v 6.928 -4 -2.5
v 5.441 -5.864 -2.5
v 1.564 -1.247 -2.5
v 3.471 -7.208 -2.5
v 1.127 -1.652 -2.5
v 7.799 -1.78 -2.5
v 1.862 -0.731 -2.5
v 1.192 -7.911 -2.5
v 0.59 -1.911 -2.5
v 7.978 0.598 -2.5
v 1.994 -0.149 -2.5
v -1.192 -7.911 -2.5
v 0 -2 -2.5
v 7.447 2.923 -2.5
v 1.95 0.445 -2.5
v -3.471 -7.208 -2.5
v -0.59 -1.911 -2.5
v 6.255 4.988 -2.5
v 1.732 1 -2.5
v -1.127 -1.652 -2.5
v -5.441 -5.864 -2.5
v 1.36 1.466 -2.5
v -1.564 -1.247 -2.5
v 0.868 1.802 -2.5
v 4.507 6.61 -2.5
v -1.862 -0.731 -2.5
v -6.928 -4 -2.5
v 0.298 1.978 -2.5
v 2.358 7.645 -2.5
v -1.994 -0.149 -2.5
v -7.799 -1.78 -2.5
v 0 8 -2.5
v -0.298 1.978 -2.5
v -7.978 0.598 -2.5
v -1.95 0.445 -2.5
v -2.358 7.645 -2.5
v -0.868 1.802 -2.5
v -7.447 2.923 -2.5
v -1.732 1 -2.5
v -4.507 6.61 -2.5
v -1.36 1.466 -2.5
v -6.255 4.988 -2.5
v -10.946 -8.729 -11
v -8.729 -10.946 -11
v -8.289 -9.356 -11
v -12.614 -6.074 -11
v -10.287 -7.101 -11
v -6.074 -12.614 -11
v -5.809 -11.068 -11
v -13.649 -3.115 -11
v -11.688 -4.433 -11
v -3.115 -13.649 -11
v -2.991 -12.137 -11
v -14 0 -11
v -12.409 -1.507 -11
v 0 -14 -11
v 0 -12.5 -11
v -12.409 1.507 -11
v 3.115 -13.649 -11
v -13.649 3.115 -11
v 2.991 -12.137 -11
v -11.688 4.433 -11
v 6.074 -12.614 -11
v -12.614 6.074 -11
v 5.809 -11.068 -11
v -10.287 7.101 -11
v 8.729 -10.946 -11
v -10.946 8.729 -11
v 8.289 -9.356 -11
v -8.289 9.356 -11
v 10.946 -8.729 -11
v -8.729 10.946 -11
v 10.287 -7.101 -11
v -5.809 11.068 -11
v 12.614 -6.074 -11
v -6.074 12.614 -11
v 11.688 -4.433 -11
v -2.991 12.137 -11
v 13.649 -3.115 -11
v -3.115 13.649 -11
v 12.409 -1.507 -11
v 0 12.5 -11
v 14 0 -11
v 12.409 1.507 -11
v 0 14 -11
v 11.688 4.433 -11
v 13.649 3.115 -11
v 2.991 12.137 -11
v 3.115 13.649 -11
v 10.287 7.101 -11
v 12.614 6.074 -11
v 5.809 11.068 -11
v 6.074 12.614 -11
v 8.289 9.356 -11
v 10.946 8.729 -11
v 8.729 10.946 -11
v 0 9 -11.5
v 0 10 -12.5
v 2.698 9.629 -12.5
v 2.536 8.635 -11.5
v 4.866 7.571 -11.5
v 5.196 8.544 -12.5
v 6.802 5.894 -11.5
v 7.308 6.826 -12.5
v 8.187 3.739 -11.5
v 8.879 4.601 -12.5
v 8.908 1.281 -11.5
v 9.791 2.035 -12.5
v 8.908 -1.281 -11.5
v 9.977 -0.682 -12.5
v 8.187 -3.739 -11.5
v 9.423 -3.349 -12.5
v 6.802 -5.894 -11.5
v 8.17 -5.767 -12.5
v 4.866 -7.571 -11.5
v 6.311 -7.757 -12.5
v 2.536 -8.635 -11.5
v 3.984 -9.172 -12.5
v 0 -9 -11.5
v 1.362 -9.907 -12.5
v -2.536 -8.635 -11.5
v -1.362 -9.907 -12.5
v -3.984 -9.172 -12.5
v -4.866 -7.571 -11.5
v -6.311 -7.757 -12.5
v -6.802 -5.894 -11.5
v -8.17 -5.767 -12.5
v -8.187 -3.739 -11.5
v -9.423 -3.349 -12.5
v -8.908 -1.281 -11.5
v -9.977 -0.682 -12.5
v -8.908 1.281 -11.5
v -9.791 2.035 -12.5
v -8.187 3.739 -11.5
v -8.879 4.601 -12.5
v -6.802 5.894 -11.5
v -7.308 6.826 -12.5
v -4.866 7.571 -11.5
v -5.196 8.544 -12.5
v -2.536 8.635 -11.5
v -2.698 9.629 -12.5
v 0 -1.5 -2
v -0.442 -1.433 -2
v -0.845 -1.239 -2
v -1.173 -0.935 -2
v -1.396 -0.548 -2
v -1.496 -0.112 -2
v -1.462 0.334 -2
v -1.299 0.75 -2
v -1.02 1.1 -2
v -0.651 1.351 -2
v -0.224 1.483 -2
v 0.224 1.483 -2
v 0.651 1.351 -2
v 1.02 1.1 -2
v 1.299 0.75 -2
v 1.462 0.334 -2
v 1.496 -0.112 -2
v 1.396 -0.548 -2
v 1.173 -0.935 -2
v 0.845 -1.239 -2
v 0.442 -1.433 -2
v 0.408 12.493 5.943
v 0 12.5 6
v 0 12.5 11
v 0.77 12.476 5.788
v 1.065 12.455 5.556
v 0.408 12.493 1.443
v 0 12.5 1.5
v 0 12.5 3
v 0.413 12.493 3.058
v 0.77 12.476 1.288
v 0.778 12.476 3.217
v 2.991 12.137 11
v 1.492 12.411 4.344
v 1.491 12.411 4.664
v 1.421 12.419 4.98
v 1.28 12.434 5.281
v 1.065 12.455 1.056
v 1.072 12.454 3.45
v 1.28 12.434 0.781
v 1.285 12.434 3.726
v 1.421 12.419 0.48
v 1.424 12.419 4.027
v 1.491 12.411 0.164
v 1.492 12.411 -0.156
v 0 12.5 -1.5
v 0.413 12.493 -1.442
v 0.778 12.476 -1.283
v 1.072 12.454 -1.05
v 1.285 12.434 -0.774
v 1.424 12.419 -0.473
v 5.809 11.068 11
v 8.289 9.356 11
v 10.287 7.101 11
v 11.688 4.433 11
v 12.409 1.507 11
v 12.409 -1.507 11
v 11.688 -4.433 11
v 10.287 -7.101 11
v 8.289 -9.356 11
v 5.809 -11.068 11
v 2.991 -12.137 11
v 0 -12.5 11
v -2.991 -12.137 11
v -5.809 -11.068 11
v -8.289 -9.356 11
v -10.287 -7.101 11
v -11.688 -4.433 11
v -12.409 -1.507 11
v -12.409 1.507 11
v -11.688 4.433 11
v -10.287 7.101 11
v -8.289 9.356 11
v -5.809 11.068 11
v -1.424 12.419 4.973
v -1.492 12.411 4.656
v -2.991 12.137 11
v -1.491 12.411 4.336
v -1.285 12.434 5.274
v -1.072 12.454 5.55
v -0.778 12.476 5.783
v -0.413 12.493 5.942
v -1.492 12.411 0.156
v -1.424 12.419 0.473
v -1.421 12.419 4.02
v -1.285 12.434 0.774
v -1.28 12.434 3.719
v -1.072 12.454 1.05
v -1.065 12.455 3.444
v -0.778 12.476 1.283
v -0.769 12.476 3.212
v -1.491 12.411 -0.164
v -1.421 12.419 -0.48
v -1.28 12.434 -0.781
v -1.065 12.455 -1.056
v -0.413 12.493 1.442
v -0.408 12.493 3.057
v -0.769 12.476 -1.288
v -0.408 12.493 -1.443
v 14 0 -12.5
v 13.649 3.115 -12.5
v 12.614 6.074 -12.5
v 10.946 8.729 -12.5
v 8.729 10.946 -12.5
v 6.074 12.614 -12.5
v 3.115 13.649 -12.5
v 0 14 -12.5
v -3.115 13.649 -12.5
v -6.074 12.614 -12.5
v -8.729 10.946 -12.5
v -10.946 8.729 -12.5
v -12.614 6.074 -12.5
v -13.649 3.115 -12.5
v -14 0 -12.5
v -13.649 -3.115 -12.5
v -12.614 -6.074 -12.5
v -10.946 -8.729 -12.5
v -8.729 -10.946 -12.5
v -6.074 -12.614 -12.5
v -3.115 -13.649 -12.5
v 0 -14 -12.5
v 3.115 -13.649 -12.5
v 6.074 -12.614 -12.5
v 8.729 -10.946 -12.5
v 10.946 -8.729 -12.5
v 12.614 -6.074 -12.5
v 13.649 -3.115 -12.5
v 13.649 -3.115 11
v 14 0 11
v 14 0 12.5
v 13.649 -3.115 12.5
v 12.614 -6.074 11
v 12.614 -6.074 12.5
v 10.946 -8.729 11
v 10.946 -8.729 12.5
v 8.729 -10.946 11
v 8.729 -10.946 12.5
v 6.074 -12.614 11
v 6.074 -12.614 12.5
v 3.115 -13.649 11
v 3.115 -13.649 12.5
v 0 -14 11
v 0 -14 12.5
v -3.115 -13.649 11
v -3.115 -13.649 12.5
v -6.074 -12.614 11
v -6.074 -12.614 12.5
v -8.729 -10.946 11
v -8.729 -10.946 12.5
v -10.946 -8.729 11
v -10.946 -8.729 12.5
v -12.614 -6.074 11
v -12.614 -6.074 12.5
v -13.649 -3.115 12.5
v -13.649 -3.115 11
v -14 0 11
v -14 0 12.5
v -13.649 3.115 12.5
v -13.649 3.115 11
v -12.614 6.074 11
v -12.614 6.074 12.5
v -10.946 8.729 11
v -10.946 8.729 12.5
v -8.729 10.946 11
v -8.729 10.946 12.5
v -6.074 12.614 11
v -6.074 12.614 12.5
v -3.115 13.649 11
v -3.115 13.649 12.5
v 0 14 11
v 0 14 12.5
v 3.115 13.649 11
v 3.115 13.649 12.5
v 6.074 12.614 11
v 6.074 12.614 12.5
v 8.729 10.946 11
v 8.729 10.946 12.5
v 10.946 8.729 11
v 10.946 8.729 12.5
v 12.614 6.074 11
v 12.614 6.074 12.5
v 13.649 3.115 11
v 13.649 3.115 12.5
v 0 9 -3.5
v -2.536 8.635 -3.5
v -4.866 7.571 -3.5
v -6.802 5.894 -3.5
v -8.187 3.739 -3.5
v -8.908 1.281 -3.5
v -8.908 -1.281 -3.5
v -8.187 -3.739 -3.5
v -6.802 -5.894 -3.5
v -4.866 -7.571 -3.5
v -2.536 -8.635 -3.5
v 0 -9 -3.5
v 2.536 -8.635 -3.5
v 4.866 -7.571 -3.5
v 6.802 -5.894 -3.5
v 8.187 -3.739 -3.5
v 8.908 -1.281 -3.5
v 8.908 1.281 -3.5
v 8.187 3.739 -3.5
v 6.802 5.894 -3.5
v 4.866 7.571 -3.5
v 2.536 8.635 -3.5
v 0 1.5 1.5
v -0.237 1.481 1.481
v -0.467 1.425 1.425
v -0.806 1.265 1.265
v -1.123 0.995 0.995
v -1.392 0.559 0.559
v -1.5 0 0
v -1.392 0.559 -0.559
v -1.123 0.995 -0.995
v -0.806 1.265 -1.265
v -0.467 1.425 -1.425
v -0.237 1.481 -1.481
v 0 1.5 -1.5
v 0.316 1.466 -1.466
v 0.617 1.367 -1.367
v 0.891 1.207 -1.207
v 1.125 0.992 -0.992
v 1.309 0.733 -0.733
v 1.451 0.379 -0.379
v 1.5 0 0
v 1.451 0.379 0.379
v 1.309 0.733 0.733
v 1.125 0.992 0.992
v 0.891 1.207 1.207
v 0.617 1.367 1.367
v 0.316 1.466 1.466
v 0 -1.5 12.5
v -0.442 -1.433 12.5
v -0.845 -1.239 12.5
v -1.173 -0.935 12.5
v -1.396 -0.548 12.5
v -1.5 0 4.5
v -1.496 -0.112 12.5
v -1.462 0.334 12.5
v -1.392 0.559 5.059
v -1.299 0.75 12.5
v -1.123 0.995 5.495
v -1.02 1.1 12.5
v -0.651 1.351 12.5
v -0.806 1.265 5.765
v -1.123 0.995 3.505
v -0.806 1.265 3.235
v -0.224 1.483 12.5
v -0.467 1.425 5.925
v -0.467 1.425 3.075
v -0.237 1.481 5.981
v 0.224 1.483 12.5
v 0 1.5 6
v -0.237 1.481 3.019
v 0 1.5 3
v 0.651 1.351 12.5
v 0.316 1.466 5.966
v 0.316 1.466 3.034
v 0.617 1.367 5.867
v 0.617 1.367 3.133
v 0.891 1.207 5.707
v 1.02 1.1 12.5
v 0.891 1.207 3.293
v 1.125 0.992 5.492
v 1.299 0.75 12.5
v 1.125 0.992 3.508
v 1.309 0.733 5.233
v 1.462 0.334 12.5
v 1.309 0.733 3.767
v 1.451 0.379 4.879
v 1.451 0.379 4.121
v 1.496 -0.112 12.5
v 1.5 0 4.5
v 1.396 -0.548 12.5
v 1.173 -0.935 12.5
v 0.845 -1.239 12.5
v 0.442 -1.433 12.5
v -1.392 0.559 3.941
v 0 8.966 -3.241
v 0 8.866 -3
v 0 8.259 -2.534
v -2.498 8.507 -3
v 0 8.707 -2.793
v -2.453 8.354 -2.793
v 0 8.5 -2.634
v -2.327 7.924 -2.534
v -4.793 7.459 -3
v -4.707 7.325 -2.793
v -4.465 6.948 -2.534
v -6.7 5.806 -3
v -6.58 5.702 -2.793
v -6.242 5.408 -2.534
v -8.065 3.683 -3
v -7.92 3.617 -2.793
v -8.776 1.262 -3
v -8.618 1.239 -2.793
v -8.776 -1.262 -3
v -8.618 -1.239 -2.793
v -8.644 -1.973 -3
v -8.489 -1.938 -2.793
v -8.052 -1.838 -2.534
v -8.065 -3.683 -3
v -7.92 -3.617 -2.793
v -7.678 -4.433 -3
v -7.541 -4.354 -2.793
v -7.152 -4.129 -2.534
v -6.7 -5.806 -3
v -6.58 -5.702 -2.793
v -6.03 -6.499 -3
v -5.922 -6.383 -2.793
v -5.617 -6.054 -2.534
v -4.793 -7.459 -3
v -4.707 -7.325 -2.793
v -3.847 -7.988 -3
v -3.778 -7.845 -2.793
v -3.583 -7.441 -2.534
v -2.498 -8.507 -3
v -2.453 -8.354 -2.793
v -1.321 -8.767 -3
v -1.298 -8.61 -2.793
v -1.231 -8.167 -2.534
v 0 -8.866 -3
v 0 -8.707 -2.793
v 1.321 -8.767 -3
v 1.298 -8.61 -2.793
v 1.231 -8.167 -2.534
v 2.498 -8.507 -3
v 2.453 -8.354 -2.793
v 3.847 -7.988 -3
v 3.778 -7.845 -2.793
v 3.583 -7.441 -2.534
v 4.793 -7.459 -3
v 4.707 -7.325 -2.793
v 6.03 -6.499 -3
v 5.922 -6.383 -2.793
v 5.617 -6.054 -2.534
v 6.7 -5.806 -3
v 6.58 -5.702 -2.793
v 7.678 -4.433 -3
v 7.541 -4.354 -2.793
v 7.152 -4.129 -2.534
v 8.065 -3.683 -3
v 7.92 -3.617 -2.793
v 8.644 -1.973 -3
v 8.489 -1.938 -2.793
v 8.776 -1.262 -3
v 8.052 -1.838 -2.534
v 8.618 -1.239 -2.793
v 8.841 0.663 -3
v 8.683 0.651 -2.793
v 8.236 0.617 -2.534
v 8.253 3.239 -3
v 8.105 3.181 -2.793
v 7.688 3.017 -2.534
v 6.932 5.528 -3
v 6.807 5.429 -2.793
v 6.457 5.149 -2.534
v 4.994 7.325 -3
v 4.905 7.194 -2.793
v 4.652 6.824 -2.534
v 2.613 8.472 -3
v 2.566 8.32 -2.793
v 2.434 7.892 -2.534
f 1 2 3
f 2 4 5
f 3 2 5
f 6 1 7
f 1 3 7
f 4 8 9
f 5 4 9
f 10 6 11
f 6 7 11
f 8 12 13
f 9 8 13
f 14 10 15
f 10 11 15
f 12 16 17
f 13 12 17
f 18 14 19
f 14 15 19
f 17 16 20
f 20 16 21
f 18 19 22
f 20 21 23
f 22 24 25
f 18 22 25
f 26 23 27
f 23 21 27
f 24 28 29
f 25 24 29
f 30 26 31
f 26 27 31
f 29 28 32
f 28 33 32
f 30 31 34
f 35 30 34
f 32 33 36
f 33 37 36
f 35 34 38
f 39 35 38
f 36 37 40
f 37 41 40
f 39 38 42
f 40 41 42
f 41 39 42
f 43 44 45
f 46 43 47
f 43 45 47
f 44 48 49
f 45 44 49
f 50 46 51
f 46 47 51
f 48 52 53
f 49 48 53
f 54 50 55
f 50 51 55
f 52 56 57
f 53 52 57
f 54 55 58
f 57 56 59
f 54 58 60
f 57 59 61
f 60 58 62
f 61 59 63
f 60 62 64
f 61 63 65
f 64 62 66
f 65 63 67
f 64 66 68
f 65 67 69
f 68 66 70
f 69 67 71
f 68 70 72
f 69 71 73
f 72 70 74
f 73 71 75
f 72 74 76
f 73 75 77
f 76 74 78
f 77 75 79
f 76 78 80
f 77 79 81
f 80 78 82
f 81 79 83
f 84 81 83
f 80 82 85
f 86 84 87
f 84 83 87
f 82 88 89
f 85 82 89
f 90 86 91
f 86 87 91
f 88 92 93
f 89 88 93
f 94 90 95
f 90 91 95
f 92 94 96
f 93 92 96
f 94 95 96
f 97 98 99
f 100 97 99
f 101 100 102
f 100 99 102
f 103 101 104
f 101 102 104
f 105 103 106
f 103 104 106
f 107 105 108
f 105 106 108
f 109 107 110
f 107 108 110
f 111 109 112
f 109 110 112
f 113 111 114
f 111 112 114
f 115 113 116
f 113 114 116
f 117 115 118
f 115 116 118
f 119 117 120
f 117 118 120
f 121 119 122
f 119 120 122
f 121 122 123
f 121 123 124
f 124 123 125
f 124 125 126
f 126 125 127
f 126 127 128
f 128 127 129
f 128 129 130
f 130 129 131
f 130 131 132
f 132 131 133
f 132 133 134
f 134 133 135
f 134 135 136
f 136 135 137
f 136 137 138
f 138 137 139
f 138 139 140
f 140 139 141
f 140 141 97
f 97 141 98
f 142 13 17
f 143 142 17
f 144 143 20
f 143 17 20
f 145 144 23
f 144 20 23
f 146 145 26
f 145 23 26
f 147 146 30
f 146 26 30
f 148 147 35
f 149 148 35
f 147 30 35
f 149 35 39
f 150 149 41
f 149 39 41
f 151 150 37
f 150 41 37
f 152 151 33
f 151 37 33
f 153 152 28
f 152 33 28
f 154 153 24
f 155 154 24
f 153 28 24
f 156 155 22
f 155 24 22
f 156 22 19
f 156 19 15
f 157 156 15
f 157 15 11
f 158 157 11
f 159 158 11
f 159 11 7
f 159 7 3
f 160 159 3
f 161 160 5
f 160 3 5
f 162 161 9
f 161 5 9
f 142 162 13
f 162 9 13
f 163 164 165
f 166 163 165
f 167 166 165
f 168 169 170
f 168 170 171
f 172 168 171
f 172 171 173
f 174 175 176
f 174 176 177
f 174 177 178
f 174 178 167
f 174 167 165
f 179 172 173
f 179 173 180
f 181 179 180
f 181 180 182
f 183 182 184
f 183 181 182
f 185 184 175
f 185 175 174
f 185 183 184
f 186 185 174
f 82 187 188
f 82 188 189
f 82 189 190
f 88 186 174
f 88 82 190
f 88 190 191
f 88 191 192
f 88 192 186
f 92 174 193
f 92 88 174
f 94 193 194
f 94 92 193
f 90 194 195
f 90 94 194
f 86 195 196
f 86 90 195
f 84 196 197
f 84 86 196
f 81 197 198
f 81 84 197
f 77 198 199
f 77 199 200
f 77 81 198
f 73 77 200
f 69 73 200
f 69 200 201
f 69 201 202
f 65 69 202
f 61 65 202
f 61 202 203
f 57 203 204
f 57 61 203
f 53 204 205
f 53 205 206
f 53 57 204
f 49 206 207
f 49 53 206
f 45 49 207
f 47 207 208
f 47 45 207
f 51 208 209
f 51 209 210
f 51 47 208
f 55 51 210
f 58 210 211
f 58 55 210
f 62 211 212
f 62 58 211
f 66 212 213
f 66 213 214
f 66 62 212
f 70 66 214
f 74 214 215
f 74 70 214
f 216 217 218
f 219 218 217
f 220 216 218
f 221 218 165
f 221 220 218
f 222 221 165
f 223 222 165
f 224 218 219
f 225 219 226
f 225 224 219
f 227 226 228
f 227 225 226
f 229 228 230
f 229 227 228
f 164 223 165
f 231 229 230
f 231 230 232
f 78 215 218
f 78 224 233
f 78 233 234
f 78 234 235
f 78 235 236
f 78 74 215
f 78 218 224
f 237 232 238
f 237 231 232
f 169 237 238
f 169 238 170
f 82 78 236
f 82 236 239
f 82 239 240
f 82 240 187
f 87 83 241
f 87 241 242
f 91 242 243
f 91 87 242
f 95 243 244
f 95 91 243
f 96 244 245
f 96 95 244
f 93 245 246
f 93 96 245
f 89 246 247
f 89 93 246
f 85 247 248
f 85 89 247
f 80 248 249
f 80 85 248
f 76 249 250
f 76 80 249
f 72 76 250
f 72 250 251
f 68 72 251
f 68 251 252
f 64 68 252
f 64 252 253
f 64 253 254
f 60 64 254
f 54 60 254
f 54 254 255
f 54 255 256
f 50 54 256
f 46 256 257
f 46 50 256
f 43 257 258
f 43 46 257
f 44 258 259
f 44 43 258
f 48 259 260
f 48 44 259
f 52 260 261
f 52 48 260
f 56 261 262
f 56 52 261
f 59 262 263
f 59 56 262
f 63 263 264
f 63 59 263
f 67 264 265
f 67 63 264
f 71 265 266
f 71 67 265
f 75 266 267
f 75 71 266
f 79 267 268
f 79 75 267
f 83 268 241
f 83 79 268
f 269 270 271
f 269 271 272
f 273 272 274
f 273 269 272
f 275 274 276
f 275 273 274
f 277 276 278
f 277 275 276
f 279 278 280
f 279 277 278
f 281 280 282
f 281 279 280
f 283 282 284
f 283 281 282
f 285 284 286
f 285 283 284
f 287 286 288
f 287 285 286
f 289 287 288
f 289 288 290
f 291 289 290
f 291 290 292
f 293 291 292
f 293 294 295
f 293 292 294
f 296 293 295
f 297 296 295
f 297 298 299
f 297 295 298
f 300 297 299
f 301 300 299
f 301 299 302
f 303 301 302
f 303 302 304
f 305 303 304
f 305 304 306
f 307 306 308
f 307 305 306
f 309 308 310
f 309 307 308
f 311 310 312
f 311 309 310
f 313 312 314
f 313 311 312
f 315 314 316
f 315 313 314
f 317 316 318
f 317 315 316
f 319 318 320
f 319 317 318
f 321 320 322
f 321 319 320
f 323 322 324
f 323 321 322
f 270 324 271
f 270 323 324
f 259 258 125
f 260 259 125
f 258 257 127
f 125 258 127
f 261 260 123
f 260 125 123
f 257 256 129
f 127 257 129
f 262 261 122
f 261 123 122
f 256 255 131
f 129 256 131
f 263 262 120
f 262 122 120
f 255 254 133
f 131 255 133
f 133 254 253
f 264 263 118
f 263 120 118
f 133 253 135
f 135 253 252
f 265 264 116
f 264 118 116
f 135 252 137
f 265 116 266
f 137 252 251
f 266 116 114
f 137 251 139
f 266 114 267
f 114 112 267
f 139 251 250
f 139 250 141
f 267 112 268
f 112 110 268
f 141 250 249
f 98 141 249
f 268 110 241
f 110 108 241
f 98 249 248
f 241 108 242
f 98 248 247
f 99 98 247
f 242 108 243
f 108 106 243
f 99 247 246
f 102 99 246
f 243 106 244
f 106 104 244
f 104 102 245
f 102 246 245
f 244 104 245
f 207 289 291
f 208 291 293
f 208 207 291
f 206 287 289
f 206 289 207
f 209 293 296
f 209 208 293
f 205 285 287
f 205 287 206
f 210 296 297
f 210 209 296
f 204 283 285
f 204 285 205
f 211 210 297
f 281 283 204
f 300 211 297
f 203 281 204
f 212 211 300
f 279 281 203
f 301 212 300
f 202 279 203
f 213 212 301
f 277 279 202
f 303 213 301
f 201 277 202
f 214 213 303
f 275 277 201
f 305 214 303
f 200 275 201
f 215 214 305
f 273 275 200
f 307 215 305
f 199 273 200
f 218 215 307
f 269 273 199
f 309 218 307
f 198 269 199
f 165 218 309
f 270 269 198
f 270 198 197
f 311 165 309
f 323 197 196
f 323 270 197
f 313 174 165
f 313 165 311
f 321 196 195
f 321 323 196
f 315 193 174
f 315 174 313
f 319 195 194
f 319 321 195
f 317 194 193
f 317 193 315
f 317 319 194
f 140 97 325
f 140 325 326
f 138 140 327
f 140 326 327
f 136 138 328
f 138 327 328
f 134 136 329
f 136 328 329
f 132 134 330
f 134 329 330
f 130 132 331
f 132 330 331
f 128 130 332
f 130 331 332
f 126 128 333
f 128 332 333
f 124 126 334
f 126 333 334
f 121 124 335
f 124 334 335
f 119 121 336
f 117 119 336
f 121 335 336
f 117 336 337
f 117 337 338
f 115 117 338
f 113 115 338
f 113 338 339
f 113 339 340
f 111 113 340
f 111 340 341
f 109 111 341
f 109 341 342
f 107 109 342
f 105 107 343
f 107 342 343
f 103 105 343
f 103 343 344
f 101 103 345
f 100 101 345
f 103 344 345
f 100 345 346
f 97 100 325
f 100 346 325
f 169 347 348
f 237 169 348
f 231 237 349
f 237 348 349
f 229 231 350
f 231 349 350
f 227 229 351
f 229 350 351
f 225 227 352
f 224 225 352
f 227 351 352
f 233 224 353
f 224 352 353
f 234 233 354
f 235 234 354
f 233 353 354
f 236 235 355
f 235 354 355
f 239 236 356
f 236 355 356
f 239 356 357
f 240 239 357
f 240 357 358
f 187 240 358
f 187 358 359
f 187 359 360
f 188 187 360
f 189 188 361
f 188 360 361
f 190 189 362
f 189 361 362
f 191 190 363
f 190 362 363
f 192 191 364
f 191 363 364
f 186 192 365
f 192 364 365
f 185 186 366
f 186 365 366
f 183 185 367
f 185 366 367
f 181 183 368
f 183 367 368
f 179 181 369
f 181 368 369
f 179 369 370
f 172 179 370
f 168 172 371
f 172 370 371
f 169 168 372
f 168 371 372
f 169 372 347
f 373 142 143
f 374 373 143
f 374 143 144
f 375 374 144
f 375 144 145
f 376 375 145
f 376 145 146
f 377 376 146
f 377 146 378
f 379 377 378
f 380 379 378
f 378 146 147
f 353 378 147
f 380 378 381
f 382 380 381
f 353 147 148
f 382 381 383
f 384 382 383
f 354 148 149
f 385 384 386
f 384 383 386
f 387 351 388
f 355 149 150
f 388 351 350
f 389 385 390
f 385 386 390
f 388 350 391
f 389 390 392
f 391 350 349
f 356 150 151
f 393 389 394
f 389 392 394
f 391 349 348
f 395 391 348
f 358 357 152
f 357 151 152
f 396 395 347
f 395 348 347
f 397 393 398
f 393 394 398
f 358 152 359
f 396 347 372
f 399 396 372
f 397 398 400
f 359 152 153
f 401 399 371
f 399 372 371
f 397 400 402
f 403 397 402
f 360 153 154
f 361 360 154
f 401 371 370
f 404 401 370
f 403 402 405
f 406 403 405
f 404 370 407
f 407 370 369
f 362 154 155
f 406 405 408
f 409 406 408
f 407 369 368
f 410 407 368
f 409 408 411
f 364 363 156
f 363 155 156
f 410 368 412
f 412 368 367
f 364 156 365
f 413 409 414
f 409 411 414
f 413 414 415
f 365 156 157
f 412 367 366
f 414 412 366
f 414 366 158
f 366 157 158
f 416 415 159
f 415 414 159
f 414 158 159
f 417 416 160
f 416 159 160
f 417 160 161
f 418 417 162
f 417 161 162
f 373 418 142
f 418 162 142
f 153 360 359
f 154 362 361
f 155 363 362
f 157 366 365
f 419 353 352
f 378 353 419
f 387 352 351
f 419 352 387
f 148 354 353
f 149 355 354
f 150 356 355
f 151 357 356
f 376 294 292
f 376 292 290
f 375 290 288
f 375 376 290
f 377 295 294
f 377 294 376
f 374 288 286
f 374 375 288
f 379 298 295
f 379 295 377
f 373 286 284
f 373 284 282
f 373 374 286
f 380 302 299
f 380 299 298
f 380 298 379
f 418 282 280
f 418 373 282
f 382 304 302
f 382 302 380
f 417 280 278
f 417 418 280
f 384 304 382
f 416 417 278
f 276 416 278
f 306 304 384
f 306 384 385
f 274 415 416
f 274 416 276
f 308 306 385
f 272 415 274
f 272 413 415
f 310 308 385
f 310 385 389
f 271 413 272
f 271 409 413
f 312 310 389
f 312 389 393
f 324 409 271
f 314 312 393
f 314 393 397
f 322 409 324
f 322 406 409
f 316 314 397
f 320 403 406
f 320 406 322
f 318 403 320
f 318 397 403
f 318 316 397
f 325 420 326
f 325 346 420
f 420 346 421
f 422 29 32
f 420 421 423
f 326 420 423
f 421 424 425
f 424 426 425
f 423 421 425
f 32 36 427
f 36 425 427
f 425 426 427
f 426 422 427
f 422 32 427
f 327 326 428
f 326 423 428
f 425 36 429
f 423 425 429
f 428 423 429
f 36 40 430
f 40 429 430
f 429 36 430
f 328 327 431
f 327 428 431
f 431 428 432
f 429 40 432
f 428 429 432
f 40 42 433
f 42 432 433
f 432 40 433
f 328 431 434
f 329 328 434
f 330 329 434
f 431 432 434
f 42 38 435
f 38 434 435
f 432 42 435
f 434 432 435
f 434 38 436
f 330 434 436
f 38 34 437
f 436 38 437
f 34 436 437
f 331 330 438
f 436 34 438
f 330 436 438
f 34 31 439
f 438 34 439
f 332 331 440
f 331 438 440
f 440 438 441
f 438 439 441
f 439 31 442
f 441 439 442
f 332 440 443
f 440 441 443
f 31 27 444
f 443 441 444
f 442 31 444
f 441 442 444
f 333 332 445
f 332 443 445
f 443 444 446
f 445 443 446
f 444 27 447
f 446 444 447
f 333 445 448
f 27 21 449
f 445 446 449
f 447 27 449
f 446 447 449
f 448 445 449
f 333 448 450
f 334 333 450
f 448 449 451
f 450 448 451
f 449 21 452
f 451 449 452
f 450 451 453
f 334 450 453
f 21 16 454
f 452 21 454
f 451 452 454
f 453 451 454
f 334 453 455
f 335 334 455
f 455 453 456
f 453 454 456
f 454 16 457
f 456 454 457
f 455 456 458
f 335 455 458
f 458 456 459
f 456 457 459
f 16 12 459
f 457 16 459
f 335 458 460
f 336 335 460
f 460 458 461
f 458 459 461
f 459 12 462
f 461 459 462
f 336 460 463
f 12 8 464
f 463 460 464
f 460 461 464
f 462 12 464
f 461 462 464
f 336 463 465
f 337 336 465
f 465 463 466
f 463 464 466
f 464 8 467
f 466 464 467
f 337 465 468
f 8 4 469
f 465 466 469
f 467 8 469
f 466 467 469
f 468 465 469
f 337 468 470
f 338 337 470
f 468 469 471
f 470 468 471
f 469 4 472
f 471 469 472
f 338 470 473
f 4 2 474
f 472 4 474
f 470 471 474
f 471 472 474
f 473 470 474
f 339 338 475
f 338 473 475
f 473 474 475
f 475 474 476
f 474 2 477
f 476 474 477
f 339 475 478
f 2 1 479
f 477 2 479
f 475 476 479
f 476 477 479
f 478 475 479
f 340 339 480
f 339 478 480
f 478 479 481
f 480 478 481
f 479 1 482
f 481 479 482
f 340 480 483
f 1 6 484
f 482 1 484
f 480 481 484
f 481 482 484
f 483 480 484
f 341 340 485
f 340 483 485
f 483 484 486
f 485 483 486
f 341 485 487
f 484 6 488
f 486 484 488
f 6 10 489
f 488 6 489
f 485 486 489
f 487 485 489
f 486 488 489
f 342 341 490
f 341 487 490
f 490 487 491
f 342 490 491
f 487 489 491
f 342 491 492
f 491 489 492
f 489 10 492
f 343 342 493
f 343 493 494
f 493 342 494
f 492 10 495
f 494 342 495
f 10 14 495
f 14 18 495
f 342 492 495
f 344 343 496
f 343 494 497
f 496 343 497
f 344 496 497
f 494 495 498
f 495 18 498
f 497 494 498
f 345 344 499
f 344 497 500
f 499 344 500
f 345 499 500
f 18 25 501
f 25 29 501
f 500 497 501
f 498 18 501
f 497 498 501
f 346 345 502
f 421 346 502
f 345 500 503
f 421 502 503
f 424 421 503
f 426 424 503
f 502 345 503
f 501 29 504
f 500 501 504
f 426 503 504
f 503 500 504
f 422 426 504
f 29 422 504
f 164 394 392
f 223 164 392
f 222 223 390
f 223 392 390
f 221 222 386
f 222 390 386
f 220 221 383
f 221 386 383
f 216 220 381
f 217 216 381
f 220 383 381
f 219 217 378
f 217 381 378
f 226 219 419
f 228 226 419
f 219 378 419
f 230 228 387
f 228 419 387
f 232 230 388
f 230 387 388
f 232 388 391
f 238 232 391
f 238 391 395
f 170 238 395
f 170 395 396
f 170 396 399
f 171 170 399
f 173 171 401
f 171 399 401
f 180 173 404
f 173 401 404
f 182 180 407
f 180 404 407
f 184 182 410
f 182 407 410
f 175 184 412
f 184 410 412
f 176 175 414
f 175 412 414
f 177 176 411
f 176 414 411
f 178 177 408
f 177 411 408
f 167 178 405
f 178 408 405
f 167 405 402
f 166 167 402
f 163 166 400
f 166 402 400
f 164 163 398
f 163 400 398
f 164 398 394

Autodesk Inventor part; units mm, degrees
ref_plane "YZ Plane" through (0, 0, 0) normal (1, 0, 0) x (0, 1, 0)
ref_plane "XZ Plane" through (0, 0, 0) normal (0, 1, 0) x (-1, 0, 0)
sketch "Náčrt1" plane through (0, 0, 0) normal (0, 0, 1) x (1, 0, 0)
  circle A0 centre (0, 0) radius 14
  dimension "d0" = 28
extrude "Vysunutí1" add sketch "Náčrt1" along normal mid plane 25
sketch "Náčrt2" plane through (0, 0, 0) normal (1, 0, 0) x (0, 1, 0)
  line L0 (-14, -12.5) -> (14, -12.5) projected
  line L1 (14, 12.5) -> (-14, 12.5) projected
  line L2 (14, -12.5) -> (14, 12.5) projected
  line L3 (14, 11) -> (12.5, 11)
  line L4 (12.5, 11) -> (12.5, -11)
  line L5 (12.5, -11) -> (14, -11)
  line L6 (14, -11) -> (14, 11)
  line L7 (14, 0) -> (-14, 0) construction
  line L8 (-14, -12.5) -> (-14, 12.5) projected
  line L9 (0, 12.5) -> (0, -12.5) construction
  point P0 (0, 0)
  point P1 (14, -11)
  dimension "d4" = 11
  dimension "d5" = 12.5
revolve "Rotace1" cut sketch "Náčrt2" angle 360 about axis through (0, 0, 12.5) along (0, 0, -1) contours L5 L4 L3 L2
sketch "Náčrt3" plane through (0, 0, -12.5) normal (0, 0, -1) x (-1, 0, 0)
  line L0 (-6, 5) -> (6, 5)
  line L1 (6, 5) -> (6, -5)
  line L2 (6, -5) -> (-6, -5)
  line L3 (-6, -5) -> (-6, 5)
  line L4 (-6, 5) -> (6, -5) construction
  line L5 (6, 5) -> (-6, -5) construction
  circle A0 centre (0, 0) radius 9
  dimension "d7" = 12
  dimension "d8" = 10
  dimension "d9" = 18
hole "Díra1" at (0, 0, -12.5) direction (0, 0, 1) diameter 18 depth 10
sketch "Náčrt4" plane through (0, 0, 12.5) normal (0, 0, 1) x (1, 0, 0)
  circle A0 centre (0, 0) radius 14 projected
hole "Díra2" at (0, 0, 12.5) direction (0, 0, -1) diameter 3 end through all
ref_plane "Pracovní rovina1" through (0, 12.5, 0) normal (0, -1, 0) x (1, 0, 0)
sketch "Náčrt5" plane through (0, 12.5, 0) normal (0, -1, 0) x (1, 0, 0)
  line L0 (1.5, -2.5) -> (-1.5, -2.5) projected
  line L1 (-9, -2.5) -> (9, -2.5) projected
  line L2 (0, 0) -> (0, -10.7479) construction
  point P0 (0, 4.5)
  dimension "d24" = 2.5
  dimension "d25" = 4.5
hole "Díra3" at (0, 12.5, 0) at (0, 12.5, 4.5) direction (0, -1, 0) diameter 3 depth 12.5
thread "Závit1" size "M3x0.5" class "6H" standard "ISO Metric profile" full length
thread "Závit2" size "M3x0.5" class "6H" standard "ISO Metric profile" full length
chamfer "Zkosení1" distance 1 angle 45 1 edges at (0, -9, -12.5)
fillet "Zaoblení1" radius 1 1 edges at (0, -9, -2.5)
chamfer "Zkosení2" distance 0.5 angle 45 1 edges at (0, 1.5, -2.5)
properties part number "Wheel" material "Mosaz, měkká žlutá"
